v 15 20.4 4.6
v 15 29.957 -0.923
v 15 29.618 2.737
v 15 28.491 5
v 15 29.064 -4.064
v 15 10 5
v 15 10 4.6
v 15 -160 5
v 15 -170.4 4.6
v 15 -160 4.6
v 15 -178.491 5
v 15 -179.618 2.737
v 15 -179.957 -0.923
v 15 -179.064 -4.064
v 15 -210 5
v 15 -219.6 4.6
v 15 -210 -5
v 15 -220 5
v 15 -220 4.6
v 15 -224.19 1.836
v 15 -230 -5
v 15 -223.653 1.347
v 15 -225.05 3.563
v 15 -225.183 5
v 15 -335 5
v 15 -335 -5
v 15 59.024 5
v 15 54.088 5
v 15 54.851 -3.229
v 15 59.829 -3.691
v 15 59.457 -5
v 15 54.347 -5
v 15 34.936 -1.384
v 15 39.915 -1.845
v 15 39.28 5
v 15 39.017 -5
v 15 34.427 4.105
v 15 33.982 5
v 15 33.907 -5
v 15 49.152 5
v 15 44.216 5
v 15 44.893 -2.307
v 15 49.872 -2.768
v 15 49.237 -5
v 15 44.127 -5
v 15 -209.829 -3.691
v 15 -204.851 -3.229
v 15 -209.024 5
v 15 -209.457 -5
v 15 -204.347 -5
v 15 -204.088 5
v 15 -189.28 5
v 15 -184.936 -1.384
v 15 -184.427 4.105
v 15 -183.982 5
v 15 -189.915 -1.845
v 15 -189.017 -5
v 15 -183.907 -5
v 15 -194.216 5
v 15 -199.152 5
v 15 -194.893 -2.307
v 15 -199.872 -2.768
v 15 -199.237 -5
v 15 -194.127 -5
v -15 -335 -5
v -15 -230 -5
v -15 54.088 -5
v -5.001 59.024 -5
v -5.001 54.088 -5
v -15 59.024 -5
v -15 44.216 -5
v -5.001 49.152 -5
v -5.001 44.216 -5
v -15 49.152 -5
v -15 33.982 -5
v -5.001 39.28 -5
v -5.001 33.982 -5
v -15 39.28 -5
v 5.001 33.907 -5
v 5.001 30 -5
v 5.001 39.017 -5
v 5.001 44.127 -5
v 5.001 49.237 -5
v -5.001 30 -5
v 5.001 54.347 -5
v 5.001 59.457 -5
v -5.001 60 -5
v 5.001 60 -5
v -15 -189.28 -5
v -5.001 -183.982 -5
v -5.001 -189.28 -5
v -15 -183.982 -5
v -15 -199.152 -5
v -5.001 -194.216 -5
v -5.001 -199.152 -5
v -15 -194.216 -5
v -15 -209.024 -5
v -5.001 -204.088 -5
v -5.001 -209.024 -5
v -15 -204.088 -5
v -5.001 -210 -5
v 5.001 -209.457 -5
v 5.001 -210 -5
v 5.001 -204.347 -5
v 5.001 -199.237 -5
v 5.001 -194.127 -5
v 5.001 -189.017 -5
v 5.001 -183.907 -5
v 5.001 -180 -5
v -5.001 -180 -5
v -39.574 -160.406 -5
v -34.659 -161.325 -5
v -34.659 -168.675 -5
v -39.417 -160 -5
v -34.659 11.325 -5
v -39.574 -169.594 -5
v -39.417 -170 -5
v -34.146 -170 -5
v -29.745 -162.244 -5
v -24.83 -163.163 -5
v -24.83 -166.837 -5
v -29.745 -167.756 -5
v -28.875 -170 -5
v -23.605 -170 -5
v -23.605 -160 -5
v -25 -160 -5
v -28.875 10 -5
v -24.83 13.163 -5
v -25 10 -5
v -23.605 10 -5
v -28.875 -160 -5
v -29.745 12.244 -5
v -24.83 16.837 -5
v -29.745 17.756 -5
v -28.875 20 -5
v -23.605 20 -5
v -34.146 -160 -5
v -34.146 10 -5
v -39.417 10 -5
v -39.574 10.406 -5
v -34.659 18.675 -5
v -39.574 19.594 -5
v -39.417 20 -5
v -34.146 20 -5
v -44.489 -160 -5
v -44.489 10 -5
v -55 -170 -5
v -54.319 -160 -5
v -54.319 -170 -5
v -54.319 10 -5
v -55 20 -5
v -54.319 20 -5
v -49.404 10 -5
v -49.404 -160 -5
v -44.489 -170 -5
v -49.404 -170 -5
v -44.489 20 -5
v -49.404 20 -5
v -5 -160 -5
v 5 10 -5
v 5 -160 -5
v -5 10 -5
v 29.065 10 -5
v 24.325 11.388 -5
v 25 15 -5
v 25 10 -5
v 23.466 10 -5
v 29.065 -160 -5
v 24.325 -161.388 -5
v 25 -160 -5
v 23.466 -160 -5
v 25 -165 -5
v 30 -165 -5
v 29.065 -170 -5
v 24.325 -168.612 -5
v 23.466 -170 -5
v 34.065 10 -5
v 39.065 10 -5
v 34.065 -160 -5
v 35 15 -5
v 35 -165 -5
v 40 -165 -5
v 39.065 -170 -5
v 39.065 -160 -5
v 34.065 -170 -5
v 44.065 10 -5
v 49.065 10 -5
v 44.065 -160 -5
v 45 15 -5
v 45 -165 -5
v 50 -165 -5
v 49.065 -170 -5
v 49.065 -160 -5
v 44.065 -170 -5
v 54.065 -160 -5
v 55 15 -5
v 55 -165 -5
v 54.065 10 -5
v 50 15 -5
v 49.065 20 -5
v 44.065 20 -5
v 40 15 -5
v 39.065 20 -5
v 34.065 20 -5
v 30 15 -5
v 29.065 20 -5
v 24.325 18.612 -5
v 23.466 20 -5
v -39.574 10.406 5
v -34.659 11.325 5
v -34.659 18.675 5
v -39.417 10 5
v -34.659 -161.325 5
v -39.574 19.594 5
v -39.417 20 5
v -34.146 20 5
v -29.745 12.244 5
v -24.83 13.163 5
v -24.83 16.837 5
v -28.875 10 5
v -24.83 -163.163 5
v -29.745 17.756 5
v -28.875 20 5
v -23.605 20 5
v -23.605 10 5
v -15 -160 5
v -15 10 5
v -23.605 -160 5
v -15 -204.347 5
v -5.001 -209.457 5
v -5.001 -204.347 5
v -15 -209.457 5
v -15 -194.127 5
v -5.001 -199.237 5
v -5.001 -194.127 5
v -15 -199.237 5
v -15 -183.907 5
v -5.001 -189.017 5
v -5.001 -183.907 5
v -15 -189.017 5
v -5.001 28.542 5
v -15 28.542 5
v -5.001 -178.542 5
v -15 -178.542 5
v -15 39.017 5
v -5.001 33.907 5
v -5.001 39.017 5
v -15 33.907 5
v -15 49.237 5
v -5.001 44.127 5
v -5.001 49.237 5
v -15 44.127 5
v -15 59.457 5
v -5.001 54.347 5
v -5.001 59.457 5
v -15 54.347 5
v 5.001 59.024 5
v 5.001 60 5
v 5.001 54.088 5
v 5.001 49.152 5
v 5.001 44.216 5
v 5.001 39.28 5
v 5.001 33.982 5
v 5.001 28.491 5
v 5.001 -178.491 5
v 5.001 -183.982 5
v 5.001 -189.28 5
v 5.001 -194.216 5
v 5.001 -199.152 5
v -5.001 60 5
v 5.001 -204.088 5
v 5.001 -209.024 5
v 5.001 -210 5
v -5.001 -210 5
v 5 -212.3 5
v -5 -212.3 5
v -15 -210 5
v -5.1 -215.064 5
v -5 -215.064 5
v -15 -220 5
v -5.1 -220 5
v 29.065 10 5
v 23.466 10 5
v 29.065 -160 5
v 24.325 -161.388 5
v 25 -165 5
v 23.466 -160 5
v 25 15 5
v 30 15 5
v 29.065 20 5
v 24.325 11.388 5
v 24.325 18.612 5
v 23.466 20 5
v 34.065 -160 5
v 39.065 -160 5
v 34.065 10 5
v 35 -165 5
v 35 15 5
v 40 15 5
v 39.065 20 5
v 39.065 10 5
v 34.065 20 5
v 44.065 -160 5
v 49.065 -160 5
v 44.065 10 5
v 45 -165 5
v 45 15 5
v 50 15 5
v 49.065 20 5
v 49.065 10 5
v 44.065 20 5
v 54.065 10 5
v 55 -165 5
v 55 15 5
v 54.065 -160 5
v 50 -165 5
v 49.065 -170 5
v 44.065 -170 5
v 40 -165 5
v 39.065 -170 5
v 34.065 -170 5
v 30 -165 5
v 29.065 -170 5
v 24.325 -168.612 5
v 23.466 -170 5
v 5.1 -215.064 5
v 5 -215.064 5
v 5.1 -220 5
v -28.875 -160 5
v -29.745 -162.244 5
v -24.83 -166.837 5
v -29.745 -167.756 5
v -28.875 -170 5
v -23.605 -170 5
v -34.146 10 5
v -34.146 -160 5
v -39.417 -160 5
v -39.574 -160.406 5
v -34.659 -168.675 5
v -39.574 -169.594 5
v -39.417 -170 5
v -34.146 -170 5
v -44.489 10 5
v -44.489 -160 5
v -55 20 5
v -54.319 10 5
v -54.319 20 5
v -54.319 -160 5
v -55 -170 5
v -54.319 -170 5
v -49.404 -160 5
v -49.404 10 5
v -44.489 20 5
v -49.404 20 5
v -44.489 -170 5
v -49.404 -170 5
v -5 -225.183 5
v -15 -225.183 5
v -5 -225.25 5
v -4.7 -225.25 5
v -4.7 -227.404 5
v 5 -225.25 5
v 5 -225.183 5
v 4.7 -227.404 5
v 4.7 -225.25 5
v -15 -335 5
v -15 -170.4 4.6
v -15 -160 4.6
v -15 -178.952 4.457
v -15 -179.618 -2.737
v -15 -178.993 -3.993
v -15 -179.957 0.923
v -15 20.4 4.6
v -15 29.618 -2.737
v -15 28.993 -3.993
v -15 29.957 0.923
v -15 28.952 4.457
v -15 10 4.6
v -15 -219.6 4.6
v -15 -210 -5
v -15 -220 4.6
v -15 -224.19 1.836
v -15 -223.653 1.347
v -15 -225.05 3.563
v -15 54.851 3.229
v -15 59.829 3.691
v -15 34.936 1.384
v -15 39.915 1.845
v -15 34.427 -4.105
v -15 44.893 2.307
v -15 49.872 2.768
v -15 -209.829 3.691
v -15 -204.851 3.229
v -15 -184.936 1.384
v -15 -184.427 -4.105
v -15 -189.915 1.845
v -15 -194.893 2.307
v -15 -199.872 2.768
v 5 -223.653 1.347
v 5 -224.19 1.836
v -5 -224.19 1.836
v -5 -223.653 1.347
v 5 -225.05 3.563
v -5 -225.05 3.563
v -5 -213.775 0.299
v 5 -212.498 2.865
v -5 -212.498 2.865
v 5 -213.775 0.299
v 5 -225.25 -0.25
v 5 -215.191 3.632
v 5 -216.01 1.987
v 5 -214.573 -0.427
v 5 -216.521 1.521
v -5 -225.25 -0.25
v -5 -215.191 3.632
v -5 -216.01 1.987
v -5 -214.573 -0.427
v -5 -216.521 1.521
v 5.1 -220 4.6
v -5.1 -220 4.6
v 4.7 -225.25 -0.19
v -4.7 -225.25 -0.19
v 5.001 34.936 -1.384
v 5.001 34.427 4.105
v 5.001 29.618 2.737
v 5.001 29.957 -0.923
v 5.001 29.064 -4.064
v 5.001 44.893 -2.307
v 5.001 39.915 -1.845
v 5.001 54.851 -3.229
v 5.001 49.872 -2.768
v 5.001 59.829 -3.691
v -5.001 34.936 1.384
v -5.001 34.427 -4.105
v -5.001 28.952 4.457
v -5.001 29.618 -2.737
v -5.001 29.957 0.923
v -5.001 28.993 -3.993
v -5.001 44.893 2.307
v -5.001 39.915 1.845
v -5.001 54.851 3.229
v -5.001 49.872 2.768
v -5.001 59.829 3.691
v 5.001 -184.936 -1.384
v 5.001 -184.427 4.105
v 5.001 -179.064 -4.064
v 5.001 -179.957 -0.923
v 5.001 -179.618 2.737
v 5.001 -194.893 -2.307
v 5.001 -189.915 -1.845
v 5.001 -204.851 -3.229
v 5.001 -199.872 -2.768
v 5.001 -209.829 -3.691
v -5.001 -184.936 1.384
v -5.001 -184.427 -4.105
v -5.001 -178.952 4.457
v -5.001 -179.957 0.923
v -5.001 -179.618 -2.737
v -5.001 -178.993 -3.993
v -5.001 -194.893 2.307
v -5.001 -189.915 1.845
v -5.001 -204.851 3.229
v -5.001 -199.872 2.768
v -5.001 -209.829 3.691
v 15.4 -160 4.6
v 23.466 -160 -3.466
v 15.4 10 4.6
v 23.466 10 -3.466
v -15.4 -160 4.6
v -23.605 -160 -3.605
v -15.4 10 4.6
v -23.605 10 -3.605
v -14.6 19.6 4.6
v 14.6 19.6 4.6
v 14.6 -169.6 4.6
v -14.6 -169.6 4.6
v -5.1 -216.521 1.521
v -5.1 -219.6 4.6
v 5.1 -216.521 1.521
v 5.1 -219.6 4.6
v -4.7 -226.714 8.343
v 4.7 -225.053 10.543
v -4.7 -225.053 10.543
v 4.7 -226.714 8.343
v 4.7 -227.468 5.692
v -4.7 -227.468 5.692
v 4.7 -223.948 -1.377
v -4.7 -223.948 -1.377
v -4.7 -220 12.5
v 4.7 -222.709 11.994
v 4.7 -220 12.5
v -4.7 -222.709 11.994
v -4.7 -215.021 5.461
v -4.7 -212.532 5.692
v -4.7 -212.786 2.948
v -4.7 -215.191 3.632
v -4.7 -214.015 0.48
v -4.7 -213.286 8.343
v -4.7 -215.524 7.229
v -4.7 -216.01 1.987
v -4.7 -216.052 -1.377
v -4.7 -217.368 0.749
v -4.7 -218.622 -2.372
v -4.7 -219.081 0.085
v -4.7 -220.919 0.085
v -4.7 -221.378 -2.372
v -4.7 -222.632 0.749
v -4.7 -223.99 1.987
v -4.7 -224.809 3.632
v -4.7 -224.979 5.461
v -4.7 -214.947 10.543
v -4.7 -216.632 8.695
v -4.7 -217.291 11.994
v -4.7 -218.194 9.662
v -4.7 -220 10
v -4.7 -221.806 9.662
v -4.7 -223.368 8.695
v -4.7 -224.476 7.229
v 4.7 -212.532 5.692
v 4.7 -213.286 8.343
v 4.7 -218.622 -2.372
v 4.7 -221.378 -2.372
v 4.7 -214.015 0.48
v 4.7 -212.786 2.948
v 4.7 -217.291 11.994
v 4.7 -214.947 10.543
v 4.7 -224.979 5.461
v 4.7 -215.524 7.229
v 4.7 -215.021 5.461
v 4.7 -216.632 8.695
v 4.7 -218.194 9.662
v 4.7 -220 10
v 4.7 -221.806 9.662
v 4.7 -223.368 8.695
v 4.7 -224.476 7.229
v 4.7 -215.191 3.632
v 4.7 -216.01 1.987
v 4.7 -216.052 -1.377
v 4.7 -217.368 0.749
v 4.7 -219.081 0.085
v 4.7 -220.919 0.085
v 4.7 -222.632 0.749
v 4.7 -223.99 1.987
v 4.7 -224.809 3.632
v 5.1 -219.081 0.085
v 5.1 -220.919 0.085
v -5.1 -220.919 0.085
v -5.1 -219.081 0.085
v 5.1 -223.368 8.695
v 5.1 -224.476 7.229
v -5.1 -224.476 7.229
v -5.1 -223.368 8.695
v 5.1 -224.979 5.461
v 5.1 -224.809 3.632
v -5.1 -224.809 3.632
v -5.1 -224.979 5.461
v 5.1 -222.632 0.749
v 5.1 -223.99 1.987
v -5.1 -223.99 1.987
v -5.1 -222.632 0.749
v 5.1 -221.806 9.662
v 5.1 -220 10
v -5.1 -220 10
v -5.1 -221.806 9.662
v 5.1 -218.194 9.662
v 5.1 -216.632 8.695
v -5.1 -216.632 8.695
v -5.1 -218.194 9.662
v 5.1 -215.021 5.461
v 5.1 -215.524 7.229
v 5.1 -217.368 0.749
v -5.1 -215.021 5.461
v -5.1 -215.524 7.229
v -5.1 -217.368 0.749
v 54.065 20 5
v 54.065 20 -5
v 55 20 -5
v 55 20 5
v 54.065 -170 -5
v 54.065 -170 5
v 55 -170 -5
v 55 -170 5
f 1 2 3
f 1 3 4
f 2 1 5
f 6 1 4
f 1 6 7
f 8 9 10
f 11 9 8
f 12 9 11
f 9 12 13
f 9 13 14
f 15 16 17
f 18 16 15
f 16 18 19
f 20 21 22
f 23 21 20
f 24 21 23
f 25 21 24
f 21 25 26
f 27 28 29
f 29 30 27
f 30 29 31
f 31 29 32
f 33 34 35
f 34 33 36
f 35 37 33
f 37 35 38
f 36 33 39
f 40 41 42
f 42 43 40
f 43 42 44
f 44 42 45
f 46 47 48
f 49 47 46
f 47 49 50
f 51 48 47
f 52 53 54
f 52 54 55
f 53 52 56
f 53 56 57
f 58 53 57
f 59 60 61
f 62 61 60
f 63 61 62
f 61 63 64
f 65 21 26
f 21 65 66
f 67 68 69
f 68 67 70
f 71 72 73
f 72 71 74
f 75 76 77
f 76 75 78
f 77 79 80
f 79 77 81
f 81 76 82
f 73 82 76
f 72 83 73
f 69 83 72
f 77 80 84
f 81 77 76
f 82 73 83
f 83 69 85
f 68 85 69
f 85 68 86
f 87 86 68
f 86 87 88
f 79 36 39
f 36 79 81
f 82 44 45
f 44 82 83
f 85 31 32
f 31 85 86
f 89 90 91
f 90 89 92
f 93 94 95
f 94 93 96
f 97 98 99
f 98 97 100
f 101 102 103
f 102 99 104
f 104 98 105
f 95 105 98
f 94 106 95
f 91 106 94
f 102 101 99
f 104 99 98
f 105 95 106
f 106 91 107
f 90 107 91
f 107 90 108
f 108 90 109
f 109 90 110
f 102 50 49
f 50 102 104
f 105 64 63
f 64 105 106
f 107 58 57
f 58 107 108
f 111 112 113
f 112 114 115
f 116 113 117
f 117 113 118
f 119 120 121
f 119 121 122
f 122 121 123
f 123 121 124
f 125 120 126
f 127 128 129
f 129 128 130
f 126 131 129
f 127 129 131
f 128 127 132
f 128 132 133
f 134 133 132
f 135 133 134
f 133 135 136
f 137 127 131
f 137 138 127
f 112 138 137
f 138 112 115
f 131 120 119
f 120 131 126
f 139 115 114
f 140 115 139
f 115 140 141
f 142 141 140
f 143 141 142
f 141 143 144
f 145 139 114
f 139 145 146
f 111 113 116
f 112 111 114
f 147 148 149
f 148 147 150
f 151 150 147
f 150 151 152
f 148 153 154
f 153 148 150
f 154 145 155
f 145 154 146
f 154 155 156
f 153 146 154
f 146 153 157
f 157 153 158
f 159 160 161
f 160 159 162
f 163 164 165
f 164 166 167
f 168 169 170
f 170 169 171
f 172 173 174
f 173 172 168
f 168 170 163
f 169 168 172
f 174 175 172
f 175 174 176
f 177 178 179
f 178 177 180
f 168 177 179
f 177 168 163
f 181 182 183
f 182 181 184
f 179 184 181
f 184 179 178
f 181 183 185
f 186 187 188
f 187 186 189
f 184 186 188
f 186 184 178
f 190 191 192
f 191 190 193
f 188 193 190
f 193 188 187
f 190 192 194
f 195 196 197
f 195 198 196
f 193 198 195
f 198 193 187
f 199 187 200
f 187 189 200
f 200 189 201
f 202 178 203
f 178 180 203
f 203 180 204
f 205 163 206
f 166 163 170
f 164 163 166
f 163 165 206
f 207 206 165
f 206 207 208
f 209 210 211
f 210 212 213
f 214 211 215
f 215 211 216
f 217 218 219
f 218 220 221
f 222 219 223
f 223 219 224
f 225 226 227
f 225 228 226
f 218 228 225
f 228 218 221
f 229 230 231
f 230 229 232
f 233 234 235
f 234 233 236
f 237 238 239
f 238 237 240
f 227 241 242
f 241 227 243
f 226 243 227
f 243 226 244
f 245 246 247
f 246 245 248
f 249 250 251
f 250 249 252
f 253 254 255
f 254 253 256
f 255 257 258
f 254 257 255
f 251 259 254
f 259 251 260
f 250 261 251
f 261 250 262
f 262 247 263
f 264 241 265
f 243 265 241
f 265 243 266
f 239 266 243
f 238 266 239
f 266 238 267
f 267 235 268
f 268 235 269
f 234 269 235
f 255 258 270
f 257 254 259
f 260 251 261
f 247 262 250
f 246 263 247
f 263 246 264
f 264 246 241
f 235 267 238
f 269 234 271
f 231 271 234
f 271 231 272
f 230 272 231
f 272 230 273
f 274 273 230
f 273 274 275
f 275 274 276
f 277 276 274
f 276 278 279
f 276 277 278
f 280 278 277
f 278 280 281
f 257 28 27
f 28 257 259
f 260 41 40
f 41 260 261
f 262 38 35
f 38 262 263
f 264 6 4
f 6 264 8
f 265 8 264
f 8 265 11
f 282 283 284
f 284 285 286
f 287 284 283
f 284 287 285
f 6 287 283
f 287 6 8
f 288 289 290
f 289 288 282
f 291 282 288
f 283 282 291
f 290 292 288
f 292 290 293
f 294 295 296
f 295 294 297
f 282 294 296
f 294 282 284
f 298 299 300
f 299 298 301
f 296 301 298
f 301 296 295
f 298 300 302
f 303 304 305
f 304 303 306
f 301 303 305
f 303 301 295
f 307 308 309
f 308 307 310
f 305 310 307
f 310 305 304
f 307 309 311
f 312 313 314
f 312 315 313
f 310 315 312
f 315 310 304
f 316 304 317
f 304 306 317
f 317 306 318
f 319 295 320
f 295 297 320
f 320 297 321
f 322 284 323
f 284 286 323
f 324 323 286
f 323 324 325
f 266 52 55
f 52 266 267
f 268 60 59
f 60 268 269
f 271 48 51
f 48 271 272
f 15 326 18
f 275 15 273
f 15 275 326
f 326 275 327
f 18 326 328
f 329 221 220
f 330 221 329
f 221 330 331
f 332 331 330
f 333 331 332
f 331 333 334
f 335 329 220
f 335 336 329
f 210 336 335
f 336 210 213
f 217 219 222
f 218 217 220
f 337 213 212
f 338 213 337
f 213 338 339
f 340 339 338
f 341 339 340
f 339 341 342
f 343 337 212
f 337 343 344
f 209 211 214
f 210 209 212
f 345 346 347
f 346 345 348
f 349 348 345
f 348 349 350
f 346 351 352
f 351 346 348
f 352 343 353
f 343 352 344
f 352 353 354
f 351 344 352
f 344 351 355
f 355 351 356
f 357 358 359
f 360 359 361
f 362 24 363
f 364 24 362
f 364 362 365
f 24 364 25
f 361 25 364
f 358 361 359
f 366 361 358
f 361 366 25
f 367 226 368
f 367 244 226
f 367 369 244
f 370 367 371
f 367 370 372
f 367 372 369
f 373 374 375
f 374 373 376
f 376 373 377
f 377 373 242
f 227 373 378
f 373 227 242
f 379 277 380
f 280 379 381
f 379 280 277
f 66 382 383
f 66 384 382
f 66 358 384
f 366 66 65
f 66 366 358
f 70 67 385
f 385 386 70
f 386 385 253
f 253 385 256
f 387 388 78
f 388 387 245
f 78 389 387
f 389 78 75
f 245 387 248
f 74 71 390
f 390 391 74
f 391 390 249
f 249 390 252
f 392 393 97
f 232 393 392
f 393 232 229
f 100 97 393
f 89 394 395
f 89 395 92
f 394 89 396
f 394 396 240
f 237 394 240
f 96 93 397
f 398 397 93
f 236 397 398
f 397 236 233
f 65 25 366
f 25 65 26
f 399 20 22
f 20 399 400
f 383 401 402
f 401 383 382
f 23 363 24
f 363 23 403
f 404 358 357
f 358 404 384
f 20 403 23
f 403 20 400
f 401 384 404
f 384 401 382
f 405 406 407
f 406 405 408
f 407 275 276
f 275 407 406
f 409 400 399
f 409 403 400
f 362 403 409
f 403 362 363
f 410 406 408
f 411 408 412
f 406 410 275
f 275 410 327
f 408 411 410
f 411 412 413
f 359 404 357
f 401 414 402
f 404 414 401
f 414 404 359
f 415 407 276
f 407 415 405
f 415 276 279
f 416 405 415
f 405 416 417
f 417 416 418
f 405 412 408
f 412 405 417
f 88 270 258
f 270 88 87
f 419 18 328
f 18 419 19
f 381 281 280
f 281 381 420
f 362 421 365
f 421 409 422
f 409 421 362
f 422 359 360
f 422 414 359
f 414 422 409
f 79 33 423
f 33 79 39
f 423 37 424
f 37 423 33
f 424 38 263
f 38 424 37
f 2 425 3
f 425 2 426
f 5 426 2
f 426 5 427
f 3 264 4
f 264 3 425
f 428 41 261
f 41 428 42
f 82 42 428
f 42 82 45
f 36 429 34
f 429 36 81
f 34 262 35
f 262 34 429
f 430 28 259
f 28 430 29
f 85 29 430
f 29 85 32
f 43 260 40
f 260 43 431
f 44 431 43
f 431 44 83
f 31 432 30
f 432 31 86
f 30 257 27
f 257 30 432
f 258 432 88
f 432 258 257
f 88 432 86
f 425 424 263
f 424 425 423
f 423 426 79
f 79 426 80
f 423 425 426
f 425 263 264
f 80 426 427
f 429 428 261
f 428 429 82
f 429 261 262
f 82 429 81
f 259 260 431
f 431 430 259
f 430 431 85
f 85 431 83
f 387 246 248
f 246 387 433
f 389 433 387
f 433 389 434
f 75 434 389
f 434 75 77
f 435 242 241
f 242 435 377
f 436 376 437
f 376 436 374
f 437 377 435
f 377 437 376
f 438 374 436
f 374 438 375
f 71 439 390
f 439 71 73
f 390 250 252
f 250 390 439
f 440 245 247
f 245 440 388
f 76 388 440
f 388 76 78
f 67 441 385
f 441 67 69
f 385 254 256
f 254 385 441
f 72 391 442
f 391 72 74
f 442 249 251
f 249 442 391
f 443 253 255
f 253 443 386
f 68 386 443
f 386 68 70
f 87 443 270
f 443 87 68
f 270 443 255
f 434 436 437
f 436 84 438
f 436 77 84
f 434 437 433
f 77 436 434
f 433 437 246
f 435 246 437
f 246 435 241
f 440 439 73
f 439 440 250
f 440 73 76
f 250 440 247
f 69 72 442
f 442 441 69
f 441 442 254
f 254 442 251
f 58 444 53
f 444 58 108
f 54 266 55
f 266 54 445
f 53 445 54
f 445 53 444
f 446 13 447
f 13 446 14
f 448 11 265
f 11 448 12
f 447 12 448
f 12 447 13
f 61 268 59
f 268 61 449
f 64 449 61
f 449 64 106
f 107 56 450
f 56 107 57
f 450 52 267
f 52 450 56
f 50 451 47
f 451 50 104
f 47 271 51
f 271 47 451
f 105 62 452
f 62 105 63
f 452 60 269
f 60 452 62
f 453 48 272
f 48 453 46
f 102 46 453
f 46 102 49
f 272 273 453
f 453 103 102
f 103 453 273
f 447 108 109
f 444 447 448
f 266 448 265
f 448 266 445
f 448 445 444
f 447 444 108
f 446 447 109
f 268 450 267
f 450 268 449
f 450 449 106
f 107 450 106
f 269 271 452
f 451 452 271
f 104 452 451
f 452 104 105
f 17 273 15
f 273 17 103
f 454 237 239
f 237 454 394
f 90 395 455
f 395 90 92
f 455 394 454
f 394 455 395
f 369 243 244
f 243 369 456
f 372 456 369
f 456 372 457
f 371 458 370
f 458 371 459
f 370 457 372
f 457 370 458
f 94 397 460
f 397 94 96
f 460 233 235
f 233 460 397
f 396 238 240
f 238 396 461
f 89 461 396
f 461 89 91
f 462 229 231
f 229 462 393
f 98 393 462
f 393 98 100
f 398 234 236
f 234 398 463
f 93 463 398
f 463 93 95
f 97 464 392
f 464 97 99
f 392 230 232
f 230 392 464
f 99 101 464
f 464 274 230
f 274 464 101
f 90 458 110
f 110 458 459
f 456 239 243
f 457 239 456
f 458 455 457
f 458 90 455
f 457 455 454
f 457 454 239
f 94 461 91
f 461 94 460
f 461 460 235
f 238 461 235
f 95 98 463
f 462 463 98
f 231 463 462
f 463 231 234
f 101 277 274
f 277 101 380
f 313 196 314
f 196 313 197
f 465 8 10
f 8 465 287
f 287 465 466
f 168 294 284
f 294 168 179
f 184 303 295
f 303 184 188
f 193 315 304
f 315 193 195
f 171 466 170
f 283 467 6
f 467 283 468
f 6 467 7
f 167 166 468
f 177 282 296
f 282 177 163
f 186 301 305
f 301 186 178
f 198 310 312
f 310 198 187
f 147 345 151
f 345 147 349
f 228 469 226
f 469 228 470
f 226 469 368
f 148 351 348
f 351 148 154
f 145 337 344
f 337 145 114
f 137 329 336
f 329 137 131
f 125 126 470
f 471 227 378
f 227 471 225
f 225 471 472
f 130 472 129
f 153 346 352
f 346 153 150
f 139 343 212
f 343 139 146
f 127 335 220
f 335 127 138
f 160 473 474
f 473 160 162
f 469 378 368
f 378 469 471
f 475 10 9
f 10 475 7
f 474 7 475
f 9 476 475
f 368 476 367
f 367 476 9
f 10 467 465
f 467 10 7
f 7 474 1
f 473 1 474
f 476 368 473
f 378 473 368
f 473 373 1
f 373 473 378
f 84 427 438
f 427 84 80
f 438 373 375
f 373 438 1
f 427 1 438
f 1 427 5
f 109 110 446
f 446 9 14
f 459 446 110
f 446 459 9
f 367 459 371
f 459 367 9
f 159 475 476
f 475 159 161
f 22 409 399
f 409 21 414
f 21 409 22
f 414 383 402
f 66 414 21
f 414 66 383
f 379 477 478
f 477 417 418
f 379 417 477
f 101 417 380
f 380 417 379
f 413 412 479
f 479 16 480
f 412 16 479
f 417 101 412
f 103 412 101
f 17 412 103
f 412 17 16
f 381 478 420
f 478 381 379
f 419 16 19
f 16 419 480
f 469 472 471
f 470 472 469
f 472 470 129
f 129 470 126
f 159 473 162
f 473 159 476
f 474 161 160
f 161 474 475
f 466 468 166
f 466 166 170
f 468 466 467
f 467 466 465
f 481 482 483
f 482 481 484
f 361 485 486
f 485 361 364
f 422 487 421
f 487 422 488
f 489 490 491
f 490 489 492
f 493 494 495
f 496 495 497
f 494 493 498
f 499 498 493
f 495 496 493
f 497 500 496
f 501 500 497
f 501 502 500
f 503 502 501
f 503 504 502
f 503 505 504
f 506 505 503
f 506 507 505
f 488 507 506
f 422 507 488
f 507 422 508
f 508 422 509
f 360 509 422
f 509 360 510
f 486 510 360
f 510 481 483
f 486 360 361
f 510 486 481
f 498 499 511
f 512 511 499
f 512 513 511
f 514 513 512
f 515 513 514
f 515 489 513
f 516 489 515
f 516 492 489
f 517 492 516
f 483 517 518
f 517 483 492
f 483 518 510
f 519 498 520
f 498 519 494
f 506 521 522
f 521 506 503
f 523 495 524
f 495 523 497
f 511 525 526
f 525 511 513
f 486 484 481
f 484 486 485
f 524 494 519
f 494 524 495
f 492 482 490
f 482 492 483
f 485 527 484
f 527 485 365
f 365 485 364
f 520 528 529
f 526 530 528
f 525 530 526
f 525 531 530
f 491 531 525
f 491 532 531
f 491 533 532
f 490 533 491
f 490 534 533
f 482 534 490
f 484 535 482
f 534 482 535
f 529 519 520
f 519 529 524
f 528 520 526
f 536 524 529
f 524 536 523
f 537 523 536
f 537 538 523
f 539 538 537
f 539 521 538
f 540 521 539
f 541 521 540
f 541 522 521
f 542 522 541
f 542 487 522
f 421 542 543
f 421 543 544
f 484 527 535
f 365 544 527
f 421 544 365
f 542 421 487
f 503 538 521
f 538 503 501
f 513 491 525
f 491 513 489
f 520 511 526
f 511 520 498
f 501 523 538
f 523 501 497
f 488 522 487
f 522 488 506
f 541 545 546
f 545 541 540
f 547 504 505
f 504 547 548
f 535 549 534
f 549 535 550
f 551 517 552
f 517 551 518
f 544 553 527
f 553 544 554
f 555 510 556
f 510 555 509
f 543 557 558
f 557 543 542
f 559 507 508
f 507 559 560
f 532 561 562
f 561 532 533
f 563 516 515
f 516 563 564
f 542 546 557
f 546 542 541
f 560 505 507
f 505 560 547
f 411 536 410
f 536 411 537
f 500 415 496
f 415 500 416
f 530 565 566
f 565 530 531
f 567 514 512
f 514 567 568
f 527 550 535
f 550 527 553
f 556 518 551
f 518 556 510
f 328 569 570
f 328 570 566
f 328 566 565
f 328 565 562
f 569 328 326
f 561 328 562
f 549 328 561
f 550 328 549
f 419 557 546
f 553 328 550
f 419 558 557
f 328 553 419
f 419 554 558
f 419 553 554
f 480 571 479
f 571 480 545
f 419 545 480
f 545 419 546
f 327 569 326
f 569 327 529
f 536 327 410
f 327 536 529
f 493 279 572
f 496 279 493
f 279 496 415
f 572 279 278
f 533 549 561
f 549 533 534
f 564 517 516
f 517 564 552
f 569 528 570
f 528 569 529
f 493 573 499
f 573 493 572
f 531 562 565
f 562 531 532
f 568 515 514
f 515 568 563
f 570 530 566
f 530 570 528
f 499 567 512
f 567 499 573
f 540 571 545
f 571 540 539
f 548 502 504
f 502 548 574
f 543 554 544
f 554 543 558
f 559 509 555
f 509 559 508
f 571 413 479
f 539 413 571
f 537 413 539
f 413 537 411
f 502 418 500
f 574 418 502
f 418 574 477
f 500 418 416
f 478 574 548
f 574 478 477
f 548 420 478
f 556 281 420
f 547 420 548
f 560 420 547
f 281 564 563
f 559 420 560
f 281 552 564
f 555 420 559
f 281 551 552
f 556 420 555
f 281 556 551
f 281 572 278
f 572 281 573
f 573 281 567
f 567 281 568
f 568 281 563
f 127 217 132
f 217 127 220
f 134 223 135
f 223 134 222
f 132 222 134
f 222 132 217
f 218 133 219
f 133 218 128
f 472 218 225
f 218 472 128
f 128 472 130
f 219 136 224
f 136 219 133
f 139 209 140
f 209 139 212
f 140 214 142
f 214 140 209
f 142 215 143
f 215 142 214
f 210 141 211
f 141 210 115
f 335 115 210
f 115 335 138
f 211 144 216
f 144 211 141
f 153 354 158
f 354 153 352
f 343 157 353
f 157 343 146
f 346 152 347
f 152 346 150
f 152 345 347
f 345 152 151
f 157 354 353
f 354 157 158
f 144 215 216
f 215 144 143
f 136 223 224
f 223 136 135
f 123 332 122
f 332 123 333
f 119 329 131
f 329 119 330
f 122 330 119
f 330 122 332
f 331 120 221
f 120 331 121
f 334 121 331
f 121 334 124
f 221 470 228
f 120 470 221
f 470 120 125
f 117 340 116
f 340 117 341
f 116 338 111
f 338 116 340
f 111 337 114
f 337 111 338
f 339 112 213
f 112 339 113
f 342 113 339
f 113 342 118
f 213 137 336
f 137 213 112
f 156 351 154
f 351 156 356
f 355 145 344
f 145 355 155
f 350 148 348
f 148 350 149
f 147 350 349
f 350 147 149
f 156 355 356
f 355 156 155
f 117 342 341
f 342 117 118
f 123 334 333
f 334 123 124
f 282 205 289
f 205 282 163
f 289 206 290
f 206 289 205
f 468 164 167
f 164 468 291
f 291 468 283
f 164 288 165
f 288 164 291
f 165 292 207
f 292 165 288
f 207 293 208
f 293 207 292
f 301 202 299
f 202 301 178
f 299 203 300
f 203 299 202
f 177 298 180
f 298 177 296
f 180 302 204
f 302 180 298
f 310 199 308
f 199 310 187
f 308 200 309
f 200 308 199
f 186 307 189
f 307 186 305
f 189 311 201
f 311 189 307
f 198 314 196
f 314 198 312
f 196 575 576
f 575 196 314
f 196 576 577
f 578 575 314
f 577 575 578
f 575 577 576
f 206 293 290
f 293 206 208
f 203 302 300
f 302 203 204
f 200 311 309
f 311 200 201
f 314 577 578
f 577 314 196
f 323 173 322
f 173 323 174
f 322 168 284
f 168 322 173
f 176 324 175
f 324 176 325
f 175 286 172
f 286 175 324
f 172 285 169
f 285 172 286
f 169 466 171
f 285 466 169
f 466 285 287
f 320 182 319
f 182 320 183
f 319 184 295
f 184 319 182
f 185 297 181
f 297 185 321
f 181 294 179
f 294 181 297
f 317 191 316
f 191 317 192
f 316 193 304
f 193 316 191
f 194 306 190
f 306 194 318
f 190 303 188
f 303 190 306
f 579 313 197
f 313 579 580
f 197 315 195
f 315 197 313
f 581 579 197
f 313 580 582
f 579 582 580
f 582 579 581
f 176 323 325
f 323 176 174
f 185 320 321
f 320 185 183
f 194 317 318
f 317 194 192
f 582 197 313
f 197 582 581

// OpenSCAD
$fn=17;

// box width
w=30;
// box height
h=40;
// box depth
t=190;
// box wall thickness
s=10;

// closing layer / upper layer
cl=0.4; 
// Spiel um das Gelenk aussen
pl=0.3;
// Spiel im Gelenk innen
ip=0.5;

rotate([180,0,0]) base();


module base(){
    e=0.001;
    v=s/2-.1;
    difference(){
        union(){
            difference(){
                union(){
                    translate([  0, -h, 0]) cube([w,h,s], center=true); // platte 1
                    difference() {
                        union(){
                        // platte 5 - unter scharnier
                        translate([ 0,   h   -(h-t), 0]) cube([w,h+2*s -(h-t),s], center=true);
                        // deckel
                        translate([ 0, 2*h+s -(h-t), 0]) cube([w,t,s], center=true);
                        }
                        
                    // bohrung for duenne gelenktrommel 
                    translate([0,h/2*3+s -(h-t), -s/2]) rotate([0, 90, 0]) cylinder(d=s+ip, h=w, center=true);

                    // raum um grosse gelenktrommel
                    translate([ 0,h/2*3+s -(h-t), -s/2]) rotate([0, 90, 0]) cylinder(d=s*1.5+2*pl, h=w/3, center=true);
                    }
                // Halterung der duennen Gelenkstaebe
                color("gray") translate([ w/3,3/2*h+s/2 -(h-t), 0]) cube([w/3,s,s], center=true);
                color("gray") translate([-w/3,3/2*h+s/2 -(h-t), 0]) cube([w/3,s,s], center=true);

               color("gray") translate([  0, h+h-h/2+s+s+ip/2 -(h-t), 0]) cube([w/3,s,s], center=true); //-.5/2
                }
            // Schwalbenschwaenze vertikal
            translate([ (w-s+e)/2,-h/2, 0]) rotate([0,-90, 0]) cut( );
            translate([-(w-s+e)/2,-h/2, 0]) rotate([0, 90, 0]) cut( );
            translate([ (w-s+e)/2, h/2, 0]) rotate([0,-90, 0]) cut(-1);
            translate([-(w-s+e)/2, h/2, 0]) rotate([0, 90, 0]) cut(-1);

            }

        // platten 2 bis 4
        translate([       0, -(h-t)/2, 0]) cube([w,t    ,s], center=true);
        translate([ (h+w)/2, -(h-t)/2, 0]) cube([h,t-2*s,s], center=true);
        translate([-(h+w)/2, -(h-t)/2, 0]) cube([h,t-2*s,s], center=true);
        }

    // knickgelenke horizontal
    translate([ 0,-h/2  , 0]) CutCube(w);
    translate([ 0, h/2 -(h-t) , 0]) CutCube(w);
    translate([ 0, h/2*3+s -(h-t) , 0  ]) CutCube(w);

    // knickgelenke vertical
    translate([ -w/2, 0-(h-t)/2, 0]) rotate([0, 0, 90]) CutCube(t);
    translate([  w/2, 0-(h-t)/2, 0]) rotate([0, 0, 90]) CutCube(t);
    }


    // dicke gelenktrommel
    translate([   0,h/2*3+s   -(h-t), -s/2]) {
        difference() {
            union(){
            difference() {
                // dicke gelenktrommel
                translate([         0,0, 0]) rotate([0, 90, 0]) cylinder(d=s*1.5, h=w/3-.6, center=true);
                translate([ w/3/2-s/2,0 -(h-t)*2, 0]) rotate([0, 90, 0]) cylinder(d=s+pl, h=s+pl, center=true);
                translate([-w/3/2+s/2,0 -(h-t)*2, 0]) rotate([0, 90, 0]) cylinder(d=s+pl, h=s+pl, center=true);
                }

            translate([ w/3-s/2-v,0, 0])    rotate([ 0, 90, 0]) cylinder(d=s, h=w/3, center=true);
            translate([-w/3+s/2+v,0, 0])    rotate([ 0, 90, 0]) cylinder(d=s, h=w/3, center=true);

            translate([ w/3/2-s/2,0, 0]) rotate([0, 90, 0]) cylinder(d=s-.5, h=s-pl, center=true);
            translate([-w/3/2+s/2,0, 0]) rotate([0, 90, 0]) cylinder(d=s-.5, h=s-pl, center=true);

            }
            
// cut                  translate([0, 0, -s/2]) cube([w,w,s+e], center=true);
// cut                  translate([w/2 -6, 0, ]) cube([w,w,3*s], center=true);
            } 
        }

    translate([ -(w+h)/2, -(h-s)/2, 0])
        intersection(){
            cube([h,s,s], center=true);
            translate([ h/2, 0+h-t, 0]) cut(-1);
            }
    //!
    translate([ -(w+h)/2,  (h-s)/2   -(h-t), 0])
        intersection(){
            cube([h,s,s], center=true);
            translate([ h/2, 0+h-t, 0]) cut(-1);
            }
    translate([ (w+h)/2, -(h-s)/2, 0])
        intersection(){
            cube([h,s,s], center=true);
            translate([-h/2, 0, 0]) cut();
            }
    translate([ (w+h)/2,  (h-s)/2   -(h-t), 0])
        intersection(){
            cube([h,s,s], center=true);
            translate([-h/2, 0, 0]) cut();
            }

    module cut(v=1, m=h){
        umax=4;
        translate([0, (v<0)?-(h-t):0, 0]) 
        intersection(){
            for (u=[1:umax]){
                r=s/2+m*u/umax;
                difference(){
                        cylinder(r1=r         , r2=r         , h=s+e, center=true);
                        cylinder(r1=r-m/umax/2, r2=r-m/umax/2, h=s+e, center=true);
                        } // difference()
            //           t                  h     t, s
//            translate([0, v*(m*.75/2+s/2), 0]) cube([m*1.5,m*.75,s+2*e], center=true);
            }
 
    union(){
        translate([          0,   v*(-h/2),   0]) cube([s,h,s], center=true);
        translate([v*(s/2+h/2),          0,   0]) cube([h,s,s], center=true);
    }

        } // difference()
    } // module cut()

        
    module CutCube(w=10){
        l=2*s;
        p=sqrt(2*l*l);
        d=cl/l*p;
        rotate([90, 0, 90]) translate([ 0, -s/2, -w/2]) 
        linear_extrude(w){
            polygon(points = [ [-cl,cl], [cl,cl], [p,p], [-p,p], ]);
            }
        }
}
